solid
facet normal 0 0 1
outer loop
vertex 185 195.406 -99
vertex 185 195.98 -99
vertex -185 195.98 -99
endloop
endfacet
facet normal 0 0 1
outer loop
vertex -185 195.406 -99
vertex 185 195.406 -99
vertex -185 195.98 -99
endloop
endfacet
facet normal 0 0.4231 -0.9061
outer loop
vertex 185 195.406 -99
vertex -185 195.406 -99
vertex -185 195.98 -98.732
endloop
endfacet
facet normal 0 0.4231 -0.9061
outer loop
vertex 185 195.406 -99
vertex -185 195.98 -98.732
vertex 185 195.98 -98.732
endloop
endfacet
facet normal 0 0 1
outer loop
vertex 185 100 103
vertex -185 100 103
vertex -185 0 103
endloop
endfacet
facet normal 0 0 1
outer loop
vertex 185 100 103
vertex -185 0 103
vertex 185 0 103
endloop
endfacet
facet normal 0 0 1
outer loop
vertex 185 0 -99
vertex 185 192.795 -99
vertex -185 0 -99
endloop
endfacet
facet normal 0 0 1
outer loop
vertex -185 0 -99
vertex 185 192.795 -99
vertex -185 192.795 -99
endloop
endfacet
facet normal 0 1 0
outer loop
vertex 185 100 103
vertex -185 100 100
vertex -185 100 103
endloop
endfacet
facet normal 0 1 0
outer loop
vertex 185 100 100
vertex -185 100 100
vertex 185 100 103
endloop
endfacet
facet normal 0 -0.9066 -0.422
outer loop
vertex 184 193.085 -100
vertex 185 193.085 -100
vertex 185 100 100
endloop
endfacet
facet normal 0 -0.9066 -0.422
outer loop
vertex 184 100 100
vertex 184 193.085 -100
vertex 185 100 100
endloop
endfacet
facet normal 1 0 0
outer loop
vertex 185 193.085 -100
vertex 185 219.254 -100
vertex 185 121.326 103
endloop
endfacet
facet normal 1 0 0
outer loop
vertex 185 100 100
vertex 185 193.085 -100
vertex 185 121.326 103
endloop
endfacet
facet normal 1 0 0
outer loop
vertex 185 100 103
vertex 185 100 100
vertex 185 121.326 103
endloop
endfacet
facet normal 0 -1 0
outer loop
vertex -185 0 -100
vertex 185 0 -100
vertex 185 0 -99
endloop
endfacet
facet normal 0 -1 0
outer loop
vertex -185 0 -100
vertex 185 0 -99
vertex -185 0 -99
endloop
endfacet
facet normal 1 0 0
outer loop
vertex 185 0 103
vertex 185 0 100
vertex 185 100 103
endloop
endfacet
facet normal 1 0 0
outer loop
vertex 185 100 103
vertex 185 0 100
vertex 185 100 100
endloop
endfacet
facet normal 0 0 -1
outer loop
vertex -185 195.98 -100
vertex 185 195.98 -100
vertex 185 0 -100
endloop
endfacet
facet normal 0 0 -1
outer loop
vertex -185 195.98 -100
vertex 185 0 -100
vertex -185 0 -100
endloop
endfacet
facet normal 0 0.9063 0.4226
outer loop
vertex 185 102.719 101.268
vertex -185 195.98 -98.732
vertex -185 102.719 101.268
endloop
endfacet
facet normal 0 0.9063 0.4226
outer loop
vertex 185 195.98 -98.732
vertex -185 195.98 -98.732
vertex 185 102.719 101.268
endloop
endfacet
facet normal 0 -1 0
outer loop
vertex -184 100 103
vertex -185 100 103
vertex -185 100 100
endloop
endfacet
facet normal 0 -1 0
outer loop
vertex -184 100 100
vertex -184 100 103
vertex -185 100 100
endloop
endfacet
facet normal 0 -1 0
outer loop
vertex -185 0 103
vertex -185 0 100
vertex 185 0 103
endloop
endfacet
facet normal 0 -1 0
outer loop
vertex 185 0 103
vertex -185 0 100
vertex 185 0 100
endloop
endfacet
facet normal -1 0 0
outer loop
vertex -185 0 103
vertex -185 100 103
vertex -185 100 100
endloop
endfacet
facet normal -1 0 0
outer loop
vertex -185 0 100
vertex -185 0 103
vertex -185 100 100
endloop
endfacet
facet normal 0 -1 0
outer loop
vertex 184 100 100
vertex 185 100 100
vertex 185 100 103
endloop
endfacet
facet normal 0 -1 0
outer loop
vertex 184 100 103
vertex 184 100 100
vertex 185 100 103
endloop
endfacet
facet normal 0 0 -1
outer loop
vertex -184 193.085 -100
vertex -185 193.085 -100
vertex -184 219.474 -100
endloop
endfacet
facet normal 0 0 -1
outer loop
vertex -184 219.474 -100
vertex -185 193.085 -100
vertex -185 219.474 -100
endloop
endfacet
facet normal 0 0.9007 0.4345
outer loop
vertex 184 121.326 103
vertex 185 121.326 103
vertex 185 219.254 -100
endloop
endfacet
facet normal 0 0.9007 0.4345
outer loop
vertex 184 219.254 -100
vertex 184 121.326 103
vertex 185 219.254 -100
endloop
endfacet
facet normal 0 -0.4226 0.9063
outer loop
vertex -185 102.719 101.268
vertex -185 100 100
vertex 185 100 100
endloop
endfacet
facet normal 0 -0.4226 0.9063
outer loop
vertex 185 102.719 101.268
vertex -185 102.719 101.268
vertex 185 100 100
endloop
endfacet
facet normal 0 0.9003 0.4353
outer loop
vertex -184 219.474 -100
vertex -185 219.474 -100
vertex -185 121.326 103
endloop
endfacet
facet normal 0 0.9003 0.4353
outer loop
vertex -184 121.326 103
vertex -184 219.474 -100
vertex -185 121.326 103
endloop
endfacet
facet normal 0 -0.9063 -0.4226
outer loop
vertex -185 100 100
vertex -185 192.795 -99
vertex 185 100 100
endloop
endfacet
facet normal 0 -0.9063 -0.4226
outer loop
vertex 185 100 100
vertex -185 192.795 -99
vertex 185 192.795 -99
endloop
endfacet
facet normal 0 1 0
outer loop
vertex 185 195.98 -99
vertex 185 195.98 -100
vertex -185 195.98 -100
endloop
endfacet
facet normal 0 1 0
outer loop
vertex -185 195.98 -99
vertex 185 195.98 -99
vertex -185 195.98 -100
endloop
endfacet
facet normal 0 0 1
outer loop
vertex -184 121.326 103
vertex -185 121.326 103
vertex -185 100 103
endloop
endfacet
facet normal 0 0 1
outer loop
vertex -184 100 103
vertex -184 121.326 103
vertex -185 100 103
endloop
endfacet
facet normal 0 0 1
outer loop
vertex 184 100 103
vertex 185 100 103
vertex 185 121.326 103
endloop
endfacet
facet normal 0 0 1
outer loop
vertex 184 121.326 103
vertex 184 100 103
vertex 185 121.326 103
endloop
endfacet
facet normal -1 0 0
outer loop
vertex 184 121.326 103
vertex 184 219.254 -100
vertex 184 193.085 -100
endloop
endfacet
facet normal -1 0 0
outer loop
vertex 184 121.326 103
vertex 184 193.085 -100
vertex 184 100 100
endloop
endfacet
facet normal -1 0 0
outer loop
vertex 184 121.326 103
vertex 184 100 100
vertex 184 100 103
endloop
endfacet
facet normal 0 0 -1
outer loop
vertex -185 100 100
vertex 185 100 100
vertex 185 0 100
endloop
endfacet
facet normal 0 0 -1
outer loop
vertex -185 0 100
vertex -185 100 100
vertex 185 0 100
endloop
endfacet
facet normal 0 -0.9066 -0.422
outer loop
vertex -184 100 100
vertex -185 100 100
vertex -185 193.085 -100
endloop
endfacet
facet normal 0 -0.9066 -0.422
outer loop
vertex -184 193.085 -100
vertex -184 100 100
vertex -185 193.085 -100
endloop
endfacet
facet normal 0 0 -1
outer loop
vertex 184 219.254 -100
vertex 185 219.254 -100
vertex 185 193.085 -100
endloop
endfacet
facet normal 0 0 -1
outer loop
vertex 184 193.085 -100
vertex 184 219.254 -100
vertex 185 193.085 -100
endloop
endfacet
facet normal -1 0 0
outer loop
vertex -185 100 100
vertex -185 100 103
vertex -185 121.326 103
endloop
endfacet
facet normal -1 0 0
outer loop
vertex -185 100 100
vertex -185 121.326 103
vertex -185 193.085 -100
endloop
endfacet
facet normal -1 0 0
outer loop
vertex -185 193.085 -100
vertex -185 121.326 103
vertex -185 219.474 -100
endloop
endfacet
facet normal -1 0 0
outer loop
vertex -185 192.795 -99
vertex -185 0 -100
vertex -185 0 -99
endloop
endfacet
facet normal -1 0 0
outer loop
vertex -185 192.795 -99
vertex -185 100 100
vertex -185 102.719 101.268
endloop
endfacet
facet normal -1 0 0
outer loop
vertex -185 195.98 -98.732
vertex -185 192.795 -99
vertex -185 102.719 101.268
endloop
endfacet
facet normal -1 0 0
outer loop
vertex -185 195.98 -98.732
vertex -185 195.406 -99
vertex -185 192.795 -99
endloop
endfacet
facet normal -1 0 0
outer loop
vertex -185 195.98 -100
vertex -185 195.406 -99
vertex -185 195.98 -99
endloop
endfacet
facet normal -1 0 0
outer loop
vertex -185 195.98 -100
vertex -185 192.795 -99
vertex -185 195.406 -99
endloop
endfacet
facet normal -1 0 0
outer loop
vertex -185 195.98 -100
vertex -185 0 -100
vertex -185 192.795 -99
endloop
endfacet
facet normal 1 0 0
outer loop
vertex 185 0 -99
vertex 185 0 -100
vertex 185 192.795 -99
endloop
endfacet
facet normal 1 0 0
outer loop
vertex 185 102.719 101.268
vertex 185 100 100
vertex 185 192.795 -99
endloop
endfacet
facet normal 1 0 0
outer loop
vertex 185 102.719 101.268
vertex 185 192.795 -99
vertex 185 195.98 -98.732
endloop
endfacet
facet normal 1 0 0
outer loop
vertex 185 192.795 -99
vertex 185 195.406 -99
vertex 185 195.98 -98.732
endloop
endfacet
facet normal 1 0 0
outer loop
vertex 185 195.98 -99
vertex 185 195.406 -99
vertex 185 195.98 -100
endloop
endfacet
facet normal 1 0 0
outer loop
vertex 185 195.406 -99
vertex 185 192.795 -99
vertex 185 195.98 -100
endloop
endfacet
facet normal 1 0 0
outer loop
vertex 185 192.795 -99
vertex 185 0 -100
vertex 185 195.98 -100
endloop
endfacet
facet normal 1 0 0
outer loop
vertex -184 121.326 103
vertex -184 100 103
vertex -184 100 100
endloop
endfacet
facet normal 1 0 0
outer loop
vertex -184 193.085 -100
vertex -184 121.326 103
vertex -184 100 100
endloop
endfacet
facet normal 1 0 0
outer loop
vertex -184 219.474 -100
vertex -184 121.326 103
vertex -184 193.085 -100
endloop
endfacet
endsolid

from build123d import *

# Parameters (mm, degrees)
SKETCH1_W             = 3
SKETCH1_H             = 200
BOSS_EXTRUDE1_DEPTH   = 100
BOSS_EXTRUDE1_2_DEPTH = 100
BOSS_EXTRUDE2_DEPTH   = 3
SKETCH3_W             = 370
SKETCH3_H             = 100
BOSS_EXTRUDE3_DEPTH   = 3
BOSS_EXTRUDE4_DEPTH   = 3
SKETCH5_W             = 370
SKETCH5_H             = 220.675583793
BOSS_EXTRUDE7_DEPTH   = 3
CUT_EXTRUDE2_DEPTH    = 371
SKETCH7_W             = 370
SKETCH7_H             = 195.980454992
BOSS_EXTRUDE8_DEPTH   = 1
BOSS_EXTRUDE10_DEPTH  = 1
BOSS_EXTRUDE12_DEPTH  = 1


with BuildPart() as part:
    # Sketch1 → Boss-Extrude1 (new body)
    with BuildSketch(Plane(origin=(0, 0, 0), x_dir=(1, 0, 0), z_dir=(0, 1, 0))):
        with Locations((-183.5, 0)):
            Rectangle(SKETCH1_W, SKETCH1_H)
    extrude(amount=BOSS_EXTRUDE1_DEPTH)



with BuildPart() as body_2:
    # Sketch1 → Boss-Extrude1 2 (new body)
    with BuildSketch(Plane(origin=(0, 0, 0), x_dir=(1, 0, 0), z_dir=(0, 1, 0))):
        with Locations((183.5, 0)):
            Rectangle(SKETCH1_W, SKETCH1_H)
    extrude(amount=BOSS_EXTRUDE1_2_DEPTH)

    # Sketch2 → Boss-Extrude2 (add)
    with BuildSketch(Plane(origin=(185, 0, 0), x_dir=(0, 0, -1), z_dir=(1, 0, 0))):
        Polygon((-100, 100), (100, 100), (100, 193.261531631), align=None)
    extrude(amount=-BOSS_EXTRUDE2_DEPTH)


with BuildPart() as part_1:
    add(part.part)

    add(body_2.part)  # Boss-Extrude3 merges body 2
    # Sketch3 → Boss-Extrude3 (add)
    with BuildSketch(Plane.XY.offset(100)):
        with Locations((0, 50)):
            Rectangle(SKETCH3_W, SKETCH3_H)
    extrude(amount=BOSS_EXTRUDE3_DEPTH)

    # Sketch4 → Boss-Extrude4 (add)
    with BuildSketch(Plane.ZY.offset(185)):
        Polygon((-100, 100), (-100, 193.261531631), (100, 100), align=None)
    extrude(amount=-BOSS_EXTRUDE4_DEPTH)

    # Sketch6 → Cut-Extrude2 (cut, through all)
    with BuildSketch(Plane(origin=(185, 0, 0), x_dir=(0, 0, -1), z_dir=(1, 0, 0))):
        Polygon((100, 193.261531631), (-100, 100), (-100, 0), (100, 0), align=None)
    extrude(amount=-CUT_EXTRUDE2_DEPTH, mode=Mode.SUBTRACT)


with BuildPart() as body_2_2:
    # Sketch5 → Boss-Extrude7 (new body)
    with BuildSketch(Plane(origin=(0, 120.44160264, 56.162841672), x_dir=(1, 0, 0), z_dir=(0, 0.906307787, 0.422618262))):
        with Locations((0, 61.968839367)):
            Rectangle(SKETCH5_W, SKETCH5_H)
    extrude(amount=BOSS_EXTRUDE7_DEPTH)

    # Sketch7 → Boss-Extrude8 (add)
    with BuildSketch(Plane(origin=(0, 0, -100), x_dir=(-1, 0, 0), z_dir=(0, 0, -1))):
        with Locations((0, 97.990227496)):
            Rectangle(SKETCH7_W, SKETCH7_H)
    extrude(amount=-BOSS_EXTRUDE8_DEPTH)


with BuildPart() as body_3:
    # Sketch8 → Boss-Extrude10 (new body)
    with BuildSketch(Plane(origin=(185, 0, 0), x_dir=(0, 0, -1), z_dir=(1, 0, 0))):
        Polygon((-103, 100), (-103, 121.325535705), (100, 219.253762877), (100, 193.084600163), (-100, 100), align=None)
    extrude(amount=-BOSS_EXTRUDE10_DEPTH)


with BuildPart() as body_4:
    # Sketch9 → Boss-Extrude12 (new body)
    with BuildSketch(Plane.ZY.offset(185)):
        Polygon((103, 100), (100, 100), (-100, 193.084600163), (-100, 219.473902), (103, 121.325535705), align=None)
    extrude(amount=-BOSS_EXTRUDE12_DEPTH)


solid = Compound([part_1.part, body_2_2.part, body_3.part, body_4.part])
